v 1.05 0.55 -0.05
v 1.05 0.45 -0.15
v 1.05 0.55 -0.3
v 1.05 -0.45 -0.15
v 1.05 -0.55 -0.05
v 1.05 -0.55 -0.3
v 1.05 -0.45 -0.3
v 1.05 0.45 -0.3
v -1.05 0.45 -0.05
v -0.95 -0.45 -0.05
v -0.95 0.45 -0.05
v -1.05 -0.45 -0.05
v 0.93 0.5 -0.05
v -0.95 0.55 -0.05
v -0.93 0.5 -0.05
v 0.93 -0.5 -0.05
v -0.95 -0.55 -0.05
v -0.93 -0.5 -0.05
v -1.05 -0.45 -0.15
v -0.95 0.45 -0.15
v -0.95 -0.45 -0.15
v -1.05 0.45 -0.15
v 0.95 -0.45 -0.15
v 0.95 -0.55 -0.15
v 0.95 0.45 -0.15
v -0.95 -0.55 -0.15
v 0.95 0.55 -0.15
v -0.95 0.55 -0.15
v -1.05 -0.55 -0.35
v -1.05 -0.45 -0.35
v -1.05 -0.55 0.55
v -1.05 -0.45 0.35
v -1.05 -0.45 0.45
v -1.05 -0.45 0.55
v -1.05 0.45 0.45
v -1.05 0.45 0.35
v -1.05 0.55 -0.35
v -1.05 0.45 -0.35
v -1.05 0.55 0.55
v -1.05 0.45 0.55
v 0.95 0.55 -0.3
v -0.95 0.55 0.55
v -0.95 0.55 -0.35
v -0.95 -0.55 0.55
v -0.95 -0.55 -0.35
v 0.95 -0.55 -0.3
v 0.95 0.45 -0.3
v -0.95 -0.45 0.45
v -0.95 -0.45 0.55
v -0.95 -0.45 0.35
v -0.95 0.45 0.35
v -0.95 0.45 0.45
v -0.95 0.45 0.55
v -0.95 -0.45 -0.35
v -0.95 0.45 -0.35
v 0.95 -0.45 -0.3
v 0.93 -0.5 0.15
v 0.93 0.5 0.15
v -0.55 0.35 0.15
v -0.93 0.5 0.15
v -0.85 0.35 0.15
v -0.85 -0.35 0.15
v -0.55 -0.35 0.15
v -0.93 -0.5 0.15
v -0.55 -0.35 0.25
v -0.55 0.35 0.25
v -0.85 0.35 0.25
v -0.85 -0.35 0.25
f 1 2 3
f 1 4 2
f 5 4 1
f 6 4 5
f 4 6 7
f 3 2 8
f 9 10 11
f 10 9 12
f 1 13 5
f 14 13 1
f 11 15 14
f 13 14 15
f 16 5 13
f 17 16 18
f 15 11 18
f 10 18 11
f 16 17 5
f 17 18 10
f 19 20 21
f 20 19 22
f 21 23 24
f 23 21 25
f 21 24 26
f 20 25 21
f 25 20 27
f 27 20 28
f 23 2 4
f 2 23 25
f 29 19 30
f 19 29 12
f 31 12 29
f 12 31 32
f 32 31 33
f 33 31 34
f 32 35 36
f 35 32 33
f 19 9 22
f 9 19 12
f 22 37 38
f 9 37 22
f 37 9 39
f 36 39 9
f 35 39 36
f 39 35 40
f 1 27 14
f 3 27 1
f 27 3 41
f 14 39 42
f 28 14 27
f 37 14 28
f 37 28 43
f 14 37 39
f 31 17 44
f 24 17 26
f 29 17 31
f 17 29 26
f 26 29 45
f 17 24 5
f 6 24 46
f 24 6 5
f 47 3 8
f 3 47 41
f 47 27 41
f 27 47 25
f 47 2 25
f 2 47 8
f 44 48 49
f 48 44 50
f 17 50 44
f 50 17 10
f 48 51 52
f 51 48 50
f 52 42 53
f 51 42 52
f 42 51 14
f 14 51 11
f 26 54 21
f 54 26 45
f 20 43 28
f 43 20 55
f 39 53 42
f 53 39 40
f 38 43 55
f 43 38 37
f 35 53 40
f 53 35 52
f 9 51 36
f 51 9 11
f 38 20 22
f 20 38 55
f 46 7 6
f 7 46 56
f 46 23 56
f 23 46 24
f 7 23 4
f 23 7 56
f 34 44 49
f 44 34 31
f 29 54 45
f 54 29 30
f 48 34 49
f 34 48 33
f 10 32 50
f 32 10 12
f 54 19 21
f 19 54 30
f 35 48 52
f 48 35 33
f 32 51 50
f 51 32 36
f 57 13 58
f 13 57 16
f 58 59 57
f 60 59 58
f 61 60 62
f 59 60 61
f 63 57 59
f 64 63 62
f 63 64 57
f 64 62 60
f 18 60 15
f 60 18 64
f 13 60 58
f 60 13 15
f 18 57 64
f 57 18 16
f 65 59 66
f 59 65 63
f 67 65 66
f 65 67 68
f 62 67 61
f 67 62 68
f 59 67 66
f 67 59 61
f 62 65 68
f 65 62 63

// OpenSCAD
color("#badbed")
cube([1.86,1,0.3], center = true);

color("#cdaa7d"){
translate([0,0,-0.1])
cube([2.1,1.1,0.1], center = true);


translate([1,0.5,-0.2])
cube([0.1,0.1,0.2], center = true);

translate([-1,0.5,0.1])
cube([0.1,0.1,0.9], center = true);

translate([1,-0.5,-0.2])
cube([0.1,0.1,0.2], center = true);

translate([-1,-0.5,0.1])
cube([0.1,0.1,0.9], center = true);


translate([-1,0,0.4])
cube([0.1,0.9,0.1], center = true);
}

color("white"){
translate([-0.7,0,0.2])
cube([0.3,0.7,0.1], center = true);
}
